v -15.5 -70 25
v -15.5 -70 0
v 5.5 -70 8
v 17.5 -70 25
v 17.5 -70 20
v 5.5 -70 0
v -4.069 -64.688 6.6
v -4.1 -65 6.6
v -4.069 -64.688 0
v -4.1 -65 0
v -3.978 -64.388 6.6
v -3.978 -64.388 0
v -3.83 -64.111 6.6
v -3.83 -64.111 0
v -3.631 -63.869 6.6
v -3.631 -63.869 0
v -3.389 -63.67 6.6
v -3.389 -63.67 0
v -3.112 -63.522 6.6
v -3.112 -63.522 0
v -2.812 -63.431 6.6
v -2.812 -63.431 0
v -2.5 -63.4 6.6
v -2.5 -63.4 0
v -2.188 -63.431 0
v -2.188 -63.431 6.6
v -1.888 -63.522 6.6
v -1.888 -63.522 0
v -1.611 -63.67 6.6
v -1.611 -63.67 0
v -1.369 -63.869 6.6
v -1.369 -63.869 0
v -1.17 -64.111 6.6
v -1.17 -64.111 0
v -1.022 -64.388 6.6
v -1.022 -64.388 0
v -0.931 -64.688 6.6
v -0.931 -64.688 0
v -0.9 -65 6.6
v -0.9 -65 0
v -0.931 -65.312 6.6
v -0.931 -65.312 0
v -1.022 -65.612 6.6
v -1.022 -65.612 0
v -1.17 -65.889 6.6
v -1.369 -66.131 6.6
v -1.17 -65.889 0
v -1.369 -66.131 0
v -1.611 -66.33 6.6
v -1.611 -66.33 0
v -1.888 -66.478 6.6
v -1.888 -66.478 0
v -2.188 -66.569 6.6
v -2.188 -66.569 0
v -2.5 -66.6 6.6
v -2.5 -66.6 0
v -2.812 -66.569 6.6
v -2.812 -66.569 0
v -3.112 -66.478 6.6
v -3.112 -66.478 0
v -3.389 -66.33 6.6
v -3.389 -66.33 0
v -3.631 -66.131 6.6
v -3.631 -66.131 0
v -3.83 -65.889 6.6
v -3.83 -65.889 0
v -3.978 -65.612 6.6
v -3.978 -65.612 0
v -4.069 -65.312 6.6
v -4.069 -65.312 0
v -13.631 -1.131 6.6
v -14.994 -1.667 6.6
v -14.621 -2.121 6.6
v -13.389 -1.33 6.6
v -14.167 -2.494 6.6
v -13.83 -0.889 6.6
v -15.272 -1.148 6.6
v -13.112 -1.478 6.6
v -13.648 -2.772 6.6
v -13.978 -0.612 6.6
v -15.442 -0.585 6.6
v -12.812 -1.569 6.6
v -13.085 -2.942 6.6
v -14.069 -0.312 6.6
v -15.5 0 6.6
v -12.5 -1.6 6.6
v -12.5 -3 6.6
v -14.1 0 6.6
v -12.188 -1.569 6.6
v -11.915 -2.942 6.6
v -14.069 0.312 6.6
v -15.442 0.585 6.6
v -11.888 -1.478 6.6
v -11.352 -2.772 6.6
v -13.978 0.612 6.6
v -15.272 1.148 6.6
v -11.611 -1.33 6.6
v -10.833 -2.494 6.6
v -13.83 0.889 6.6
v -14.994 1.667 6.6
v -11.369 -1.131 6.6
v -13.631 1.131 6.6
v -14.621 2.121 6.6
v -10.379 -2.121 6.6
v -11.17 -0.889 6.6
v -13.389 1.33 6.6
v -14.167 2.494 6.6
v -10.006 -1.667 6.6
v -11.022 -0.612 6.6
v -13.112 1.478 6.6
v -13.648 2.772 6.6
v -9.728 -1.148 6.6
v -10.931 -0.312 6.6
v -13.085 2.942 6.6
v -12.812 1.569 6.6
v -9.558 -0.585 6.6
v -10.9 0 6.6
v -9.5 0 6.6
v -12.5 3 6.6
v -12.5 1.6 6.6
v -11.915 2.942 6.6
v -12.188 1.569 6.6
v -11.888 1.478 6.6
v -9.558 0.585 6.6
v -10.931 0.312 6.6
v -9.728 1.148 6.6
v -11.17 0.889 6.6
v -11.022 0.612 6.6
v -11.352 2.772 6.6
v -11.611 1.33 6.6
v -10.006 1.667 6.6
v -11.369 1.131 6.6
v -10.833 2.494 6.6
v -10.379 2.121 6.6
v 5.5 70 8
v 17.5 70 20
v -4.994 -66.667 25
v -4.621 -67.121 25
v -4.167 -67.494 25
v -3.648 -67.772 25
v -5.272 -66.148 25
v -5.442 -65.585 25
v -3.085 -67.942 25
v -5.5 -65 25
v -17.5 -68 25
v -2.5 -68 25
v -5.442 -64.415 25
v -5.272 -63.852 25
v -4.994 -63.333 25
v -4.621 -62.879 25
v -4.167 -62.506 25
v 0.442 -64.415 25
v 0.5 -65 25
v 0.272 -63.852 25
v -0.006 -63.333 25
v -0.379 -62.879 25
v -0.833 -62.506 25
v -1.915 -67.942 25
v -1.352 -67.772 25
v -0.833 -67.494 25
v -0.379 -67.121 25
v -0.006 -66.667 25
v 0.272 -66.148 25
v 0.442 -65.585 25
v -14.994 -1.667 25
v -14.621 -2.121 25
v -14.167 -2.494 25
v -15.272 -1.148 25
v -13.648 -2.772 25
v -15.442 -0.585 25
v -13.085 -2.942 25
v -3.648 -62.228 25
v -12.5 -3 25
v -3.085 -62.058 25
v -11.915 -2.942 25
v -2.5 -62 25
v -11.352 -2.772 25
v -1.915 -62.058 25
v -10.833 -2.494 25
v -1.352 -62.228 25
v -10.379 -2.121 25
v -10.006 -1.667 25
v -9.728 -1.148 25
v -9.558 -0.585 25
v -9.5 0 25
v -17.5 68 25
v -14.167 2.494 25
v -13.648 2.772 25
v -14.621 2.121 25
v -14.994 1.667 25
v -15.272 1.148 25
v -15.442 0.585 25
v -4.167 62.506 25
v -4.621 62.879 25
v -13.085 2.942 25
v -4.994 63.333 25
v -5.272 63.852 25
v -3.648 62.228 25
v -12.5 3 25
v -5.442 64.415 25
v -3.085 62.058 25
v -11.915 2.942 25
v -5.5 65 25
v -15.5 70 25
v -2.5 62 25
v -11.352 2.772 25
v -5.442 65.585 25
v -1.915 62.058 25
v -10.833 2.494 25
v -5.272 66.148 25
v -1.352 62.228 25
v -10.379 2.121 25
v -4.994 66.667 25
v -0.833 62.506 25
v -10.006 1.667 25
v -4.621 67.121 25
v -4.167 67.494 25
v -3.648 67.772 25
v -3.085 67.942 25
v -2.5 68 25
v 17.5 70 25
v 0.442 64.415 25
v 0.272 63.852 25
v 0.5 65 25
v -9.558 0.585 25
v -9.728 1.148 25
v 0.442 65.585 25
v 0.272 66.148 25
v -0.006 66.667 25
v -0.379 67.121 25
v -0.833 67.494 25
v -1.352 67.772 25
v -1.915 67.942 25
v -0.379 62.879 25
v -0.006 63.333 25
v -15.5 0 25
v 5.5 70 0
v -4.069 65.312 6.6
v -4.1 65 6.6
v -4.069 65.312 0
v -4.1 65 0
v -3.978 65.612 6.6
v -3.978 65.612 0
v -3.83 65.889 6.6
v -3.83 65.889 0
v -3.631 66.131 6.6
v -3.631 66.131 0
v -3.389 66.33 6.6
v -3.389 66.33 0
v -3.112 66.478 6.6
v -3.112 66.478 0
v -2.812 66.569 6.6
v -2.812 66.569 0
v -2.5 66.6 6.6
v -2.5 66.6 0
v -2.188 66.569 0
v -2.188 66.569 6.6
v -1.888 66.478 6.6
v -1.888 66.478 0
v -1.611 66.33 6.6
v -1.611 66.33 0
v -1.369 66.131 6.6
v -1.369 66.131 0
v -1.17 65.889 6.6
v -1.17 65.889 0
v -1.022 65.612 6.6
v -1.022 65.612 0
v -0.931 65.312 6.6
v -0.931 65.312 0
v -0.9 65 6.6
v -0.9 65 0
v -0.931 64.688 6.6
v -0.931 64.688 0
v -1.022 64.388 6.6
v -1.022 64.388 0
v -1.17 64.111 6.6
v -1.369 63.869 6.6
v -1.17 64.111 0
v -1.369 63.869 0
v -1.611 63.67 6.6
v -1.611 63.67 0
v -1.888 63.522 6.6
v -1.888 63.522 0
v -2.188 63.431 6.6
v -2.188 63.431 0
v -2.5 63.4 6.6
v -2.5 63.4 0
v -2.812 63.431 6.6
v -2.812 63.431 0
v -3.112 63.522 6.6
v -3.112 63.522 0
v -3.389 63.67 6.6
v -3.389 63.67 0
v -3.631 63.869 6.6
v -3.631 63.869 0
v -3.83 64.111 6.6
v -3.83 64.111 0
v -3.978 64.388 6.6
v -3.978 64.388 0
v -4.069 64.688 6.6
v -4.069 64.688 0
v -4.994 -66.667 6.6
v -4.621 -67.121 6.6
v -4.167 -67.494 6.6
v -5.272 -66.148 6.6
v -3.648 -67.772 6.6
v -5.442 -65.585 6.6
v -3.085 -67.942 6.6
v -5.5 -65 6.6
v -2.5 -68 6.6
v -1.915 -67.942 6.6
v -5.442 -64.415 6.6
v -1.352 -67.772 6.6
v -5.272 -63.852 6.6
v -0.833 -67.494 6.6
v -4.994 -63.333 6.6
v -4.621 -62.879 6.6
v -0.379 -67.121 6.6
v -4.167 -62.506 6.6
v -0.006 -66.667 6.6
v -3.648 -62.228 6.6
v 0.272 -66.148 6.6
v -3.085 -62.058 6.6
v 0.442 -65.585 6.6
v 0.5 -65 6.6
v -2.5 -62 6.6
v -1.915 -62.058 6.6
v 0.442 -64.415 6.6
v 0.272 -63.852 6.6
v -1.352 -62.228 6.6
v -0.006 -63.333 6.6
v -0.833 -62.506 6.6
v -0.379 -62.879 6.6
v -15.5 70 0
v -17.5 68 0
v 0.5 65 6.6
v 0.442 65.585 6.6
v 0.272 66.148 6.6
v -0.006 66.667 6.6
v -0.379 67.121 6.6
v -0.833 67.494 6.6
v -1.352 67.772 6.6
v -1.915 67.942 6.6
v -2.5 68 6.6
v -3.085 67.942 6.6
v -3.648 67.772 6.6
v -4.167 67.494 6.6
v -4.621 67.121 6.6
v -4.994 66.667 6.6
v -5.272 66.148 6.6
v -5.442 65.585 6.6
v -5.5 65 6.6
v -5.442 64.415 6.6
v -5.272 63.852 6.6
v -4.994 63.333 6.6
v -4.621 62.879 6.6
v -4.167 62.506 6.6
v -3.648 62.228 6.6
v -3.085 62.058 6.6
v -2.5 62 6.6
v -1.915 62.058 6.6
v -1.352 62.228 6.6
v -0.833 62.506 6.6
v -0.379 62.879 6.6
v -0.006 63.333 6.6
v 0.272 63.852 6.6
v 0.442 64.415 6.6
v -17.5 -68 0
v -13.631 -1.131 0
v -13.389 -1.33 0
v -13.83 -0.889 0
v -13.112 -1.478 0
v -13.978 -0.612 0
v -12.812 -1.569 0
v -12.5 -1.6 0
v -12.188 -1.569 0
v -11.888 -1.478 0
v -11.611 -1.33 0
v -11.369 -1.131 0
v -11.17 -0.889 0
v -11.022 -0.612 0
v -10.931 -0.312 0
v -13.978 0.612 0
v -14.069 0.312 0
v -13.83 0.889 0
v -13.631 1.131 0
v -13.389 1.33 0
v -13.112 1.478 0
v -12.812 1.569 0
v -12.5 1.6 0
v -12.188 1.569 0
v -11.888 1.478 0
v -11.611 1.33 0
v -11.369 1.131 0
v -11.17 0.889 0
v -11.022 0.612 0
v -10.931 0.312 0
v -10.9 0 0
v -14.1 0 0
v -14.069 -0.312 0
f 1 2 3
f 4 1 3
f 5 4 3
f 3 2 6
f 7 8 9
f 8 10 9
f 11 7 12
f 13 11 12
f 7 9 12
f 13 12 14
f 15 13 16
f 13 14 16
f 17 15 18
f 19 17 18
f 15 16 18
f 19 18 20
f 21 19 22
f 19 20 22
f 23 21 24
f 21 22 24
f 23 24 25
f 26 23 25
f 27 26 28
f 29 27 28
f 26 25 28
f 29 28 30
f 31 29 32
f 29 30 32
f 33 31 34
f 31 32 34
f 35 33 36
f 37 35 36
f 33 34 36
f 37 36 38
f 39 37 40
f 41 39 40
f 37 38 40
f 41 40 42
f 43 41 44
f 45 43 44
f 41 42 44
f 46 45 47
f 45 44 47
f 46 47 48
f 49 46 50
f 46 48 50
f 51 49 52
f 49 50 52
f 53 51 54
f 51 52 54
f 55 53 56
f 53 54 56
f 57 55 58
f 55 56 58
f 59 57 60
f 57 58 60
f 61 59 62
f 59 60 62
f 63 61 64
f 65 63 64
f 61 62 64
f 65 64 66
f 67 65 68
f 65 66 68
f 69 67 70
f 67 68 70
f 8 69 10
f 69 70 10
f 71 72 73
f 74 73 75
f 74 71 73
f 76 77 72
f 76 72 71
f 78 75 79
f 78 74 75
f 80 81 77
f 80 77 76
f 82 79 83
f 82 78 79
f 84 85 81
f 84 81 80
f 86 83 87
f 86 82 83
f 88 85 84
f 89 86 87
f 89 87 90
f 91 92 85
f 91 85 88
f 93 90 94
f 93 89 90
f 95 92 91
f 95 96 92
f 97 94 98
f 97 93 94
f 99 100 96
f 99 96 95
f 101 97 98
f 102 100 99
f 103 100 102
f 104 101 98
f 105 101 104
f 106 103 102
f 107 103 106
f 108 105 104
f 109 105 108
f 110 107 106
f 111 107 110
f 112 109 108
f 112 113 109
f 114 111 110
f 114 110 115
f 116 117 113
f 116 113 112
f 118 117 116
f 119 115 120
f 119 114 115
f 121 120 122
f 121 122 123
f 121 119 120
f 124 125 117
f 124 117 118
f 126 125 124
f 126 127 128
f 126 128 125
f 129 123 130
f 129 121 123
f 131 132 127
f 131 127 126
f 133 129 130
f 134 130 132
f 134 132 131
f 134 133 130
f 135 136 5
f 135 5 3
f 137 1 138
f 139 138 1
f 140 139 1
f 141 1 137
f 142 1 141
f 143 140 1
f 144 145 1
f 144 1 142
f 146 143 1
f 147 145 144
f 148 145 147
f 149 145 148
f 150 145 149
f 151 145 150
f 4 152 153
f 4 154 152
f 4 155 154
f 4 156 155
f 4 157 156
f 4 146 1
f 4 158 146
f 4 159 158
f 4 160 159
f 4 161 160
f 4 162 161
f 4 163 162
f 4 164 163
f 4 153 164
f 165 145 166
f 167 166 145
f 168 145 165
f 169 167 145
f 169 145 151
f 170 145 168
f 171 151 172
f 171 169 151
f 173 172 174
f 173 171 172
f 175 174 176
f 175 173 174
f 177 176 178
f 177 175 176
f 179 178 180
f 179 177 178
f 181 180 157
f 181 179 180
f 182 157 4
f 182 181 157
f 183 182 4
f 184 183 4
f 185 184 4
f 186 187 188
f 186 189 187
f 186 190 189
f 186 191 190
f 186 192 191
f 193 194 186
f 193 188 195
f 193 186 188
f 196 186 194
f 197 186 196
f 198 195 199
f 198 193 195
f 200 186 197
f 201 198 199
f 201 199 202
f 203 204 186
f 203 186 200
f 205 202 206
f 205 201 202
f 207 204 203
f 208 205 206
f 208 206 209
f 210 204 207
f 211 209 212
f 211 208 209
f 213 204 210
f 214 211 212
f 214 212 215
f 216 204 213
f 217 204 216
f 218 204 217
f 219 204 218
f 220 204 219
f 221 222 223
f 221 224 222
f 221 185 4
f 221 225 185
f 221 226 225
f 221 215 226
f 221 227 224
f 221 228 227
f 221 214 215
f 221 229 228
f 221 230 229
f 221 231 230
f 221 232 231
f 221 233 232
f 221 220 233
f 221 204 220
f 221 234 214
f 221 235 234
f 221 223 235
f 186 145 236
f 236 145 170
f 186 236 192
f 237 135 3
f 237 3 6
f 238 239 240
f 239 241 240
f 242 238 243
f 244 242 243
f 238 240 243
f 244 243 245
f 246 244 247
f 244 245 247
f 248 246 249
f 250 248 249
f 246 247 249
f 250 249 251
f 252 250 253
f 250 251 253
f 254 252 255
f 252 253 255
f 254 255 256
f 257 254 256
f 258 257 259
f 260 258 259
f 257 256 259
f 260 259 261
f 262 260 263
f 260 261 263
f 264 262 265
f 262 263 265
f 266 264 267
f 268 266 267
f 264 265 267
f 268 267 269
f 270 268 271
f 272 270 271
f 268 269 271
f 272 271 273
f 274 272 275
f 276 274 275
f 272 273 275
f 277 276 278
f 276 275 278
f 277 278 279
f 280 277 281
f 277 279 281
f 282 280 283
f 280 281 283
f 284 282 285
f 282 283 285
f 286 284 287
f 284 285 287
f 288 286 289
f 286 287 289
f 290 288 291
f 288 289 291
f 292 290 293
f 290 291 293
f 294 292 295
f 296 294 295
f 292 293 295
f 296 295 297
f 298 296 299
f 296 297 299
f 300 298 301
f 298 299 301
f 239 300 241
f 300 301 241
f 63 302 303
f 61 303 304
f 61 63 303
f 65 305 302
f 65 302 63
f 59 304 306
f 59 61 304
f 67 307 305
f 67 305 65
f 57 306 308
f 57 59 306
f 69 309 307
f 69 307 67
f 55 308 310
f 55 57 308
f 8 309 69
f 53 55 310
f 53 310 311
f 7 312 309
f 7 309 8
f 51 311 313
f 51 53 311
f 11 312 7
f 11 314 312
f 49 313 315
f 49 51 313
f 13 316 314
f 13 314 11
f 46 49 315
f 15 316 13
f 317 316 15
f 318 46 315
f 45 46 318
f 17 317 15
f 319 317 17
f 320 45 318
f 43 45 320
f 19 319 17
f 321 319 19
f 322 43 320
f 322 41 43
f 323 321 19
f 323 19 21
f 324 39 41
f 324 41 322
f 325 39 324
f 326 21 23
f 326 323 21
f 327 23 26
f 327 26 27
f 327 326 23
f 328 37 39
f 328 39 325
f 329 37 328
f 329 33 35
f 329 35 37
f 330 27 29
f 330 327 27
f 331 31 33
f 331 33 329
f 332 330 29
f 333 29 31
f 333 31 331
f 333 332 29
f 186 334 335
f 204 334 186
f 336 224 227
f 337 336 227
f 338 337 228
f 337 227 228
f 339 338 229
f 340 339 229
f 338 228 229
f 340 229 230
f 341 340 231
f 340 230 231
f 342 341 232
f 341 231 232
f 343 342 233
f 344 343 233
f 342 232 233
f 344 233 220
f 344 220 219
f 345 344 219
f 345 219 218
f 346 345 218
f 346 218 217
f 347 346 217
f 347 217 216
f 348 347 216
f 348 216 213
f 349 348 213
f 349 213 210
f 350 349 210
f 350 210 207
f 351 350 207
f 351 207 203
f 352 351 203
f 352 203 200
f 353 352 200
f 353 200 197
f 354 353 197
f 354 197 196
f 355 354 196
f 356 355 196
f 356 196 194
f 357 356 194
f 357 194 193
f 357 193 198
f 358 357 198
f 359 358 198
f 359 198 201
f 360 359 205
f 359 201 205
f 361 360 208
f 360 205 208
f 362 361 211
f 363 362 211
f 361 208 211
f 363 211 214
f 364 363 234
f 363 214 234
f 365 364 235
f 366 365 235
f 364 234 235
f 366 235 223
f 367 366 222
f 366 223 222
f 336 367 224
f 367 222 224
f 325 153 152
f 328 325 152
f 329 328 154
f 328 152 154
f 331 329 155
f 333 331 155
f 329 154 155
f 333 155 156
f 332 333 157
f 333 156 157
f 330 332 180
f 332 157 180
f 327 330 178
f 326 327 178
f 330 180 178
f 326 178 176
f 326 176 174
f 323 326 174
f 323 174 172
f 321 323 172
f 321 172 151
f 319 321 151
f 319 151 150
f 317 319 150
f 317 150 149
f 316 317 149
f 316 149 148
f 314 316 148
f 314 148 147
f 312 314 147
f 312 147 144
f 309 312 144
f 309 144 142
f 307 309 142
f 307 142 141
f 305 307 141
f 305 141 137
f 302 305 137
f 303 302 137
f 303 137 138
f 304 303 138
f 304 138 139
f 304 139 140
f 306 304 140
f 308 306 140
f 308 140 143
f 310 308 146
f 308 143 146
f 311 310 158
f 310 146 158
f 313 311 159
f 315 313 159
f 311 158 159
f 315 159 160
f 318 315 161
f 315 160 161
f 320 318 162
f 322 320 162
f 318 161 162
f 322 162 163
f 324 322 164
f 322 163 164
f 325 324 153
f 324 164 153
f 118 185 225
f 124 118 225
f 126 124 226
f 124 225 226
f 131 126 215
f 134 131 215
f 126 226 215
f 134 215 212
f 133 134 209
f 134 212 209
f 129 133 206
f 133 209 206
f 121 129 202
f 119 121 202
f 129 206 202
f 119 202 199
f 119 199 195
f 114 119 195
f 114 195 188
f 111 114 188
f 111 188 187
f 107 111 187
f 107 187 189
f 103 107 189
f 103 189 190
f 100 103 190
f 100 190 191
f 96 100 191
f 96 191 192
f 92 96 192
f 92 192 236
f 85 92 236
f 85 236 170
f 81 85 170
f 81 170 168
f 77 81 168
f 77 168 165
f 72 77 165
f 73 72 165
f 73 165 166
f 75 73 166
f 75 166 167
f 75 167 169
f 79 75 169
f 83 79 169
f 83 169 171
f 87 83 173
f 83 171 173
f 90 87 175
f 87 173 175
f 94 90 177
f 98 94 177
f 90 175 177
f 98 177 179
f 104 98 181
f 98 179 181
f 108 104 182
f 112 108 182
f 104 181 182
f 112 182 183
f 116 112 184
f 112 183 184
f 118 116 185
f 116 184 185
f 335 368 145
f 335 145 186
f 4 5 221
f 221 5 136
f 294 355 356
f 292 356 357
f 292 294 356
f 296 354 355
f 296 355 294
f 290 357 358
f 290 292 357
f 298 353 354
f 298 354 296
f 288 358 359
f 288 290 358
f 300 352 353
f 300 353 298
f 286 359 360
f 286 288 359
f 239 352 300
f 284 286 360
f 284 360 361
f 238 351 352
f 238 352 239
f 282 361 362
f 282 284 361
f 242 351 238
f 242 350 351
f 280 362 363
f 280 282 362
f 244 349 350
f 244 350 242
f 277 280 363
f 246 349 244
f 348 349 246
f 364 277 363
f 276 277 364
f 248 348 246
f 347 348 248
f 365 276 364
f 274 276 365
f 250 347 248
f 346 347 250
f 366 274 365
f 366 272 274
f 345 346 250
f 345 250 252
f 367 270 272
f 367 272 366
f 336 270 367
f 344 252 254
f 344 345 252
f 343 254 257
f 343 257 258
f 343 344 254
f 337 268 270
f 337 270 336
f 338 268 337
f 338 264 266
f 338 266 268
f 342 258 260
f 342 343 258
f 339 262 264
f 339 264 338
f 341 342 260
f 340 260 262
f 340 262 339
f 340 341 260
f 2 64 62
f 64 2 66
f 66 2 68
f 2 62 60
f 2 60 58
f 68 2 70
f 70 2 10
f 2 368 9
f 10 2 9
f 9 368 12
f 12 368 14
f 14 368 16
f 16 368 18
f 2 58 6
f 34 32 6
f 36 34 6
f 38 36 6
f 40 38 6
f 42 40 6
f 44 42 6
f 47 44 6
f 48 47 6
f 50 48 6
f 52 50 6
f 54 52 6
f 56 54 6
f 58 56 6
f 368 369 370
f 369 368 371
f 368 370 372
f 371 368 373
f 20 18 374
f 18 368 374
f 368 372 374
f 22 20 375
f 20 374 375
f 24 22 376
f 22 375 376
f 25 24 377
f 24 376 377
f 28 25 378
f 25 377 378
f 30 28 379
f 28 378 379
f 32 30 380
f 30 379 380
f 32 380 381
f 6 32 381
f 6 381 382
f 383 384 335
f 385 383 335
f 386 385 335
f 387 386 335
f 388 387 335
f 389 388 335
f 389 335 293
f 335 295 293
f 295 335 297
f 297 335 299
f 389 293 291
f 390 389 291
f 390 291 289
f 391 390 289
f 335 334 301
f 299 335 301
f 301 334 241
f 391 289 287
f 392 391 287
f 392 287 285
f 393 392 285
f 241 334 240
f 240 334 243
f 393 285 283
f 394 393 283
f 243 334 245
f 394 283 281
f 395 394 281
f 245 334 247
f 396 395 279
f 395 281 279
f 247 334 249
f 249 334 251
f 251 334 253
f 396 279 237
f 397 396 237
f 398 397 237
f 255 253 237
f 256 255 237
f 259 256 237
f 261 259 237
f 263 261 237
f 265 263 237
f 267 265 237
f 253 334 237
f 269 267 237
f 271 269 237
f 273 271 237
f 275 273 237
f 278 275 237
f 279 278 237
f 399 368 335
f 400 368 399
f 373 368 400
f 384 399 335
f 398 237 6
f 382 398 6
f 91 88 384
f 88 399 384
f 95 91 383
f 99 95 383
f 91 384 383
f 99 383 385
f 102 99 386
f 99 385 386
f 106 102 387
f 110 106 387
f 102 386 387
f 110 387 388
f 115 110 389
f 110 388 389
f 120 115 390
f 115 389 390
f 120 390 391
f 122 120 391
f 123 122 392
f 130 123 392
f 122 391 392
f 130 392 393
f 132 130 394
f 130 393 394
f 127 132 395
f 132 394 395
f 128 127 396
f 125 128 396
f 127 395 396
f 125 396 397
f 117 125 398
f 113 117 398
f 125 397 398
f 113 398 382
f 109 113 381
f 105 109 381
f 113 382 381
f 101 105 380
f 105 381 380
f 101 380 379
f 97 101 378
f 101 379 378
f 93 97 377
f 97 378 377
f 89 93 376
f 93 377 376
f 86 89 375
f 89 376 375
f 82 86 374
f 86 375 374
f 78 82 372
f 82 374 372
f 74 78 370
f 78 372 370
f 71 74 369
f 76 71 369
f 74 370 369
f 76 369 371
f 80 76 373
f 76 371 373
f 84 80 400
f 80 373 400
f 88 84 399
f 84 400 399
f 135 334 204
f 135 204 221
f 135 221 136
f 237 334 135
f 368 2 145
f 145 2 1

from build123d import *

# Parameters (mm, degrees)
SKETCH1_W                                            = 35
SKETCH1_H                                            = 140
BOSS_EXTRUDE1_DEPTH                                  = 25
CUT_EXTRUDE1_DEPTH                                   = 144.287298809
CUT_EXTRUDE1_DEPTH_BACK                              = 144.287298809
CBORE_FOR_M3_HEXAGON_SOCKET_HEAD_CAP_SCR_D           = 3.2
CBORE_FOR_M3_HEXAGON_SOCKET_HEAD_CAP_SCR_CBORE_D     = 6
CBORE_FOR_M3_HEXAGON_SOCKET_HEAD_CAP_SCR_CBORE_DEPTH = 18.4
CHAMFER1_SIZE                                        = 2


with BuildPart() as part:
    # Sketch1 → Boss-Extrude1 (new body)
    with BuildSketch(Plane.XY):
        Rectangle(SKETCH1_W, SKETCH1_H)
    extrude(amount=BOSS_EXTRUDE1_DEPTH)

    # Sketch2 → Cut-Extrude1 (cut, two sides: drawn at the far end of the back side and taken through both)
    with BuildSketch(Plane.XZ.offset(70).offset(-CUT_EXTRUDE1_DEPTH_BACK)):
        Polygon((5.5, -90.622577483), (5.5, 0), (5.5, 8), (17.5, 20), (81.579839067, 84.079839067), (247.751789779, 11.714868294), (171.671950713, -162.987548256), align=None)
    extrude(amount=CUT_EXTRUDE1_DEPTH + CUT_EXTRUDE1_DEPTH_BACK, mode=Mode.SUBTRACT)

    # CBORE for M3 Hexagon socket head cap screws1 (through all)
    with Locations(Plane.XY.offset(25)):
        with Locations((-2.5, 65), (-12.5, 0), (-2.5, -65)):
            CounterBoreHole(CBORE_FOR_M3_HEXAGON_SOCKET_HEAD_CAP_SCR_D / 2, CBORE_FOR_M3_HEXAGON_SOCKET_HEAD_CAP_SCR_CBORE_D / 2, CBORE_FOR_M3_HEXAGON_SOCKET_HEAD_CAP_SCR_CBORE_DEPTH)

    # Chamfer1
    chamfer1_edges = [part.edges().sort_by_distance(p)[0] for p in [
        (-17.5, -70, 12.5),
        (-17.5, 70, 12.5),
    ]]
    chamfer(chamfer1_edges, length=CHAMFER1_SIZE)


solid = part.part
